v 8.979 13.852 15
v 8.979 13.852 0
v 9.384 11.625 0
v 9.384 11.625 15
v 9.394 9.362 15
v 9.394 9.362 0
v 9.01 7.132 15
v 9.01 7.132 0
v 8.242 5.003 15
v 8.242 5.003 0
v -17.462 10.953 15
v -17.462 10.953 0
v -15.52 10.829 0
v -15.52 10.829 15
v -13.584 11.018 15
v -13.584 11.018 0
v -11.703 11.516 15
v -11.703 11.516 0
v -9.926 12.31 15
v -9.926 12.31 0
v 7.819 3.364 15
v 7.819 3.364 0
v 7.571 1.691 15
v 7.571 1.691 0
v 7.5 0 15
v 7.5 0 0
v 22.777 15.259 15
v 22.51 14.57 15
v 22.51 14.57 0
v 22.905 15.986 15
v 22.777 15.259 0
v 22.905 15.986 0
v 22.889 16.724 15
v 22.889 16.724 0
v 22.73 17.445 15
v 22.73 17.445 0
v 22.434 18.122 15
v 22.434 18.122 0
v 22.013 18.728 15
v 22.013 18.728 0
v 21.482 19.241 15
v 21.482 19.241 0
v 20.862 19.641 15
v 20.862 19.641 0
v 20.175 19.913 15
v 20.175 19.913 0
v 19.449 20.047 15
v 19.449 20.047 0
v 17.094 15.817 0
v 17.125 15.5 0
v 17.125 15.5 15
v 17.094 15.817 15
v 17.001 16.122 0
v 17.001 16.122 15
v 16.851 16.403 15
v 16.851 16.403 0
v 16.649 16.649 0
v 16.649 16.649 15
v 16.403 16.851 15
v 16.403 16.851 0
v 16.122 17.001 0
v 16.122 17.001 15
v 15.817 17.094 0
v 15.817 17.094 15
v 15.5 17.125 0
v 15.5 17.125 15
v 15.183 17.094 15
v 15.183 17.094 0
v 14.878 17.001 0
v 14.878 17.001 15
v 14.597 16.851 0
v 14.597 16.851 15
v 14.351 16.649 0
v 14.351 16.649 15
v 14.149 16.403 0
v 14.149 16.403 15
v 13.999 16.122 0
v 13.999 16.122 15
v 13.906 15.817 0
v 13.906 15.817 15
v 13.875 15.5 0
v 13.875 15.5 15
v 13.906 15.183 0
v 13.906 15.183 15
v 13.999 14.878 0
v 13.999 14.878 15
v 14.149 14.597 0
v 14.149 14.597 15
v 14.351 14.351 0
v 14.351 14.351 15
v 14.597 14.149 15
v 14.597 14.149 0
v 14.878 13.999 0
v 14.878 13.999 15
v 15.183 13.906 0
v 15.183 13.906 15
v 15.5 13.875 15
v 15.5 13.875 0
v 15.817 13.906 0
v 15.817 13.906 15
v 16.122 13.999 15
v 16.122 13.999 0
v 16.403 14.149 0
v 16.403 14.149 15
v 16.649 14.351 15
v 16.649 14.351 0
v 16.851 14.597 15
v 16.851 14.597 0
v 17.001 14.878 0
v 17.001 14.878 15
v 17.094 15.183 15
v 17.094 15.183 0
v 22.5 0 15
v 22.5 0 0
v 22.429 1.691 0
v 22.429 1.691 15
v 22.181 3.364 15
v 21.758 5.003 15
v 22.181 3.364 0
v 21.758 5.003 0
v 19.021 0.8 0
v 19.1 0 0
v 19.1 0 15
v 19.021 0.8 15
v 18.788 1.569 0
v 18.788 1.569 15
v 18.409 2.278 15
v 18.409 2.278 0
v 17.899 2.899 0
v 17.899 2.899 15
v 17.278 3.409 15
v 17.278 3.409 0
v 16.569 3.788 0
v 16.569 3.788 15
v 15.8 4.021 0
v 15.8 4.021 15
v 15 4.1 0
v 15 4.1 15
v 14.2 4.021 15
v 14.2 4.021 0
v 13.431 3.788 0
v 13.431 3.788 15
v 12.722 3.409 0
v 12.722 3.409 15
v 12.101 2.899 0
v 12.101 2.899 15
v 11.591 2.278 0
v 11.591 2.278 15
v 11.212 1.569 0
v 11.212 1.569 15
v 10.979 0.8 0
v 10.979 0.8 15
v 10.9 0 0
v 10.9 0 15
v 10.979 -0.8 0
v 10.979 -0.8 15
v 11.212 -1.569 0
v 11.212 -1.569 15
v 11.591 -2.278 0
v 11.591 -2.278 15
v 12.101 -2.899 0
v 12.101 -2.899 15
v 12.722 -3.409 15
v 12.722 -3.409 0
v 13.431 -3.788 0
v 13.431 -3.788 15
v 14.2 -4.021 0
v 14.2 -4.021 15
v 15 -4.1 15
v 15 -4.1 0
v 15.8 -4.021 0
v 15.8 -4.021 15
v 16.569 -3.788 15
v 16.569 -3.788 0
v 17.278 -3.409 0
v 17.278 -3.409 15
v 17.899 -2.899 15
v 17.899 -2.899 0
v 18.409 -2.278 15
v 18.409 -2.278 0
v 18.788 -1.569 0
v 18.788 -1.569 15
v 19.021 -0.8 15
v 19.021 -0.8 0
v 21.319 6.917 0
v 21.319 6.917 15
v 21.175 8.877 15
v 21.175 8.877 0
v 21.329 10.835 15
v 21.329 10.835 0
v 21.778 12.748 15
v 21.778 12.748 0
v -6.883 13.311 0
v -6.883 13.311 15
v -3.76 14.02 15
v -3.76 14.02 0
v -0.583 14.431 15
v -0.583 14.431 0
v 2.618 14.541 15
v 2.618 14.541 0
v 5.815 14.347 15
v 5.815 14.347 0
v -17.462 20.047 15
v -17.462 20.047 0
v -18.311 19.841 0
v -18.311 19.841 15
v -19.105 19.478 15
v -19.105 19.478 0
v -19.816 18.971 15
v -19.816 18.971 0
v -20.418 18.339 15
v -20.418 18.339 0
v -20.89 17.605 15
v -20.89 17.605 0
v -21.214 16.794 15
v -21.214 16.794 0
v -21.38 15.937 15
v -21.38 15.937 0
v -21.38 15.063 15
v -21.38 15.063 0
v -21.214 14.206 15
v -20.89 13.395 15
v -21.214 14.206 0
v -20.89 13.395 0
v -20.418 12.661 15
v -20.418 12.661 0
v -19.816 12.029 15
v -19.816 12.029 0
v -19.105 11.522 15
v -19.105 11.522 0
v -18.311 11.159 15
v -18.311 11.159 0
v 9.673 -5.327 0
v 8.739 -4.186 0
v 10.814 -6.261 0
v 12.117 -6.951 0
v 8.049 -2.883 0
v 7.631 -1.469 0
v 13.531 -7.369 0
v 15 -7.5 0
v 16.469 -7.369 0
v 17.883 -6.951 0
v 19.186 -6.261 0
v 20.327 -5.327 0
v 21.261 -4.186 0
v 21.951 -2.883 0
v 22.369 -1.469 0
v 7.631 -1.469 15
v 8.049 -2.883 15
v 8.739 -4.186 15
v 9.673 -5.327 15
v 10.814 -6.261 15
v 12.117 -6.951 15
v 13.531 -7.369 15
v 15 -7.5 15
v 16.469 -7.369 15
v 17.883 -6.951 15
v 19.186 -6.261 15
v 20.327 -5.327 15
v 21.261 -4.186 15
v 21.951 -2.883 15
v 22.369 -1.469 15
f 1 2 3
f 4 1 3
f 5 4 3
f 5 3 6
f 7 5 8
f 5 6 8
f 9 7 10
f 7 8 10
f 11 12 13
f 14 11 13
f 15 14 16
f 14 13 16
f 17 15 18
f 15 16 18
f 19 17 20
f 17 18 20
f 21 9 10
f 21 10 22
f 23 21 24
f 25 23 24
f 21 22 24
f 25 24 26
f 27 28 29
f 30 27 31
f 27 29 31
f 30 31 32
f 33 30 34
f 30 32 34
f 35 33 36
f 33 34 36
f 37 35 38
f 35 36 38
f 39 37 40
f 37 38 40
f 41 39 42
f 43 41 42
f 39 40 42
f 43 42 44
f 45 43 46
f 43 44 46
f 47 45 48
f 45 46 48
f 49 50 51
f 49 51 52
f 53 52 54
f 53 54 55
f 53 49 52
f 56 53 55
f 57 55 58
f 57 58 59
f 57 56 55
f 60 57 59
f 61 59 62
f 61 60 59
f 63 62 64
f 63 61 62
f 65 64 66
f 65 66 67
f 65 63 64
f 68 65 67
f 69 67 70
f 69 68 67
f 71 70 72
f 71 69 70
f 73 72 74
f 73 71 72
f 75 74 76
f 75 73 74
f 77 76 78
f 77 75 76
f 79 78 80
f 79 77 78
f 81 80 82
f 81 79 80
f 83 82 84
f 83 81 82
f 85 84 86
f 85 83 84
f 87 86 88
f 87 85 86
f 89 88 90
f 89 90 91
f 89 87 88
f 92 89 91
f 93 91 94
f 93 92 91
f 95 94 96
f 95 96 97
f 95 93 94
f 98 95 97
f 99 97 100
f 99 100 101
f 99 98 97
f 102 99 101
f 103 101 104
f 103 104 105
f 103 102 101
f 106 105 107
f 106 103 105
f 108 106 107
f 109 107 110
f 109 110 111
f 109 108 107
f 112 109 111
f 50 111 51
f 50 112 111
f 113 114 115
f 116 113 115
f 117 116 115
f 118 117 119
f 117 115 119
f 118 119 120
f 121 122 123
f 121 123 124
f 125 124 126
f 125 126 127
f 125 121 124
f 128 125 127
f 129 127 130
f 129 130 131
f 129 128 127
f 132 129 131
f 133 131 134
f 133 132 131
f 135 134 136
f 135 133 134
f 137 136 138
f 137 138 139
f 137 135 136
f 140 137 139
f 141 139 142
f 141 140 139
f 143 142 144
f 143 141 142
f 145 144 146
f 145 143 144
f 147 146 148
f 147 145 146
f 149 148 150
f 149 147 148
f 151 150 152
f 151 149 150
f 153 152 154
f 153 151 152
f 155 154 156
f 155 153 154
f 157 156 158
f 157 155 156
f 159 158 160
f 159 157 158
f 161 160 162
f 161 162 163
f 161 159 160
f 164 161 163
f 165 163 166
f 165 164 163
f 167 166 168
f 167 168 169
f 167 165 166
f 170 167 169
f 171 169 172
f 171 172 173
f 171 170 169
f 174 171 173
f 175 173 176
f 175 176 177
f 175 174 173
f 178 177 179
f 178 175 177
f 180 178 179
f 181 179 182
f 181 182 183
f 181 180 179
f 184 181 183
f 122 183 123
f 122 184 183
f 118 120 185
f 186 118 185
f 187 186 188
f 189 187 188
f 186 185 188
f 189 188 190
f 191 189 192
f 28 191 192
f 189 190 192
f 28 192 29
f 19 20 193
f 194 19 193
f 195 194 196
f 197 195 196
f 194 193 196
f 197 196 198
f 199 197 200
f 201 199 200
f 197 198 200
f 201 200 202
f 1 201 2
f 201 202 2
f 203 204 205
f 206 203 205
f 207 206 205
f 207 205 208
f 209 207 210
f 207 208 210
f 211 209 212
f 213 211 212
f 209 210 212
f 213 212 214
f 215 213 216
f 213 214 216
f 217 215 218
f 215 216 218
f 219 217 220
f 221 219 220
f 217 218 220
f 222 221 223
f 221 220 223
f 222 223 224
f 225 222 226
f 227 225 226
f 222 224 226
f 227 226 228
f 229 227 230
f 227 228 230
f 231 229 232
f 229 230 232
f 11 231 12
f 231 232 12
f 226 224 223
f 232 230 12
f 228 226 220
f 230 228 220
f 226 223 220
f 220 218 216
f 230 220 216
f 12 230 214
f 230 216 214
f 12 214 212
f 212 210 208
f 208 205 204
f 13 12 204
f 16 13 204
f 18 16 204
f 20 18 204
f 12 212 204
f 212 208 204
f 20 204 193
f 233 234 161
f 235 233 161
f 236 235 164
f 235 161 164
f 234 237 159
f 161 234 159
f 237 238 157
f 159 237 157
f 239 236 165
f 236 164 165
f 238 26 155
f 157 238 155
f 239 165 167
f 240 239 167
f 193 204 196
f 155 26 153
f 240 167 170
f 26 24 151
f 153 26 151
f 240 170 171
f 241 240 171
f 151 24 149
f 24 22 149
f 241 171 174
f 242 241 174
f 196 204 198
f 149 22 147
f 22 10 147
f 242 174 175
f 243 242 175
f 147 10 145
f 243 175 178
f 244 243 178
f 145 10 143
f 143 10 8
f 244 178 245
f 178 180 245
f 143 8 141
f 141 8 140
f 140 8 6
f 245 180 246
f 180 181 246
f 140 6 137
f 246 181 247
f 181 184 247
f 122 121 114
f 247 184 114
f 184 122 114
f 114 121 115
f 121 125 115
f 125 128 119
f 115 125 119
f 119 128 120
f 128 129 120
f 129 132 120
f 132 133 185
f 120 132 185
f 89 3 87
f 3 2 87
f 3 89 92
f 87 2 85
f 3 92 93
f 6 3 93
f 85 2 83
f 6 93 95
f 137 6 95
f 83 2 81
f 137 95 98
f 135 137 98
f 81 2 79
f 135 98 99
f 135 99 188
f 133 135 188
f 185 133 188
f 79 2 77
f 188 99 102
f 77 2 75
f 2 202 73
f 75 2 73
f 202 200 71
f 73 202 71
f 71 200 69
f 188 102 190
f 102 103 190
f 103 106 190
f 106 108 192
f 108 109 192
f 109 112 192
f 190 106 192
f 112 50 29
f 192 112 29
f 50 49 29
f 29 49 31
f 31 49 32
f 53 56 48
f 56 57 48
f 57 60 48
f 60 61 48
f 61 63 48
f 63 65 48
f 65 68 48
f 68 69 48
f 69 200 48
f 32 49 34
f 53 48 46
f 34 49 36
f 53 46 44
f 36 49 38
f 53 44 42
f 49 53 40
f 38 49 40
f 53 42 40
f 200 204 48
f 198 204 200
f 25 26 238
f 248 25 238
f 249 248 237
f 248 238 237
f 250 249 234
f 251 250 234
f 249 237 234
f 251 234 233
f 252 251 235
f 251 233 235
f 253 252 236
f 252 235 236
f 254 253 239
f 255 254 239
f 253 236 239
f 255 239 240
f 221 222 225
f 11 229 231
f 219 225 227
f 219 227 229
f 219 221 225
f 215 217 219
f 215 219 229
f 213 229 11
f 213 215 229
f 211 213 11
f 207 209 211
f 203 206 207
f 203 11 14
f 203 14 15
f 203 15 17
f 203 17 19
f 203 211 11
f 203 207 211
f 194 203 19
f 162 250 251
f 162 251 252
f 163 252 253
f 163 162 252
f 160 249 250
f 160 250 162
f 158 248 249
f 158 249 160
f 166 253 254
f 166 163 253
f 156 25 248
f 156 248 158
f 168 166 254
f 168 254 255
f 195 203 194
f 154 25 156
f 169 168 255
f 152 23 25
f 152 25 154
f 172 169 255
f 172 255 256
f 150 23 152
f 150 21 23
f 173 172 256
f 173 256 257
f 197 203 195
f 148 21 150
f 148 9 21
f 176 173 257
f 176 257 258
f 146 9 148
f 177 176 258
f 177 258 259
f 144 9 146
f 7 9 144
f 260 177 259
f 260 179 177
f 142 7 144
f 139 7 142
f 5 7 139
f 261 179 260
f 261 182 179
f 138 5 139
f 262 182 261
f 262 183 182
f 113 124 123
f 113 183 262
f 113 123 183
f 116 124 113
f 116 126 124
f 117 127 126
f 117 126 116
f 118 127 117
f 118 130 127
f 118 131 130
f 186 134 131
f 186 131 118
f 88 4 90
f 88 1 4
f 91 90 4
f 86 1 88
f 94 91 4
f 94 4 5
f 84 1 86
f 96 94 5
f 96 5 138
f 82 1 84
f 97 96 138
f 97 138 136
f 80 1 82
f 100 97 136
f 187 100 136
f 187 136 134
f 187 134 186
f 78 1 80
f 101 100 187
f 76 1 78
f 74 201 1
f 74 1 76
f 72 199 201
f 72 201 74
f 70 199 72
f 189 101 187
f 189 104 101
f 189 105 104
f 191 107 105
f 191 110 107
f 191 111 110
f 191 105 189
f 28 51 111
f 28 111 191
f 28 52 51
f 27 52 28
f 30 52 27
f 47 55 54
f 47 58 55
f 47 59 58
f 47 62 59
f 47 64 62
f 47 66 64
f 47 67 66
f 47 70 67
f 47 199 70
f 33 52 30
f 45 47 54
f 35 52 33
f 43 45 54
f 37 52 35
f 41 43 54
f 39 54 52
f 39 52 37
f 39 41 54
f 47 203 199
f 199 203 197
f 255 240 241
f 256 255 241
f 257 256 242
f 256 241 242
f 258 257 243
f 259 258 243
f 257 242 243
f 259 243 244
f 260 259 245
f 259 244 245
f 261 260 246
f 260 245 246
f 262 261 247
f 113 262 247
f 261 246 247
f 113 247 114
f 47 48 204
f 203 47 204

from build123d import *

# Parameters (mm, degrees)
F0_R     = 4.1
F0_R_2   = 1.625
F1_DEPTH = 15


with BuildPart() as f1:
    # F0 (on Top) → F1 (new body)
    with BuildSketch(Plane.XY):
        with BuildLine():
            Line((19.449329, 20.047105), (-17.462153, 20.047105))
            ThreePointArc((-17.462153, 20.047105), (-21.400342, 15.5), (-17.462153, 10.952895))
            ThreePointArc((-17.462153, 10.952895), (-13.583628, 11.018037), (-9.926019, 12.30997))
            ThreePointArc((-9.926019, 12.30997), (-0.583426, 14.431472), (8.979468, 13.851907))
            ThreePointArc((8.979468, 13.851907), (9.394135, 9.361936), (8.242019, 5.002531))
            ThreePointArc((8.242019, 5.002531), (7.672541, 2.530704), (7.5, 0))
            ThreePointArc((7.5, 0), (9.673183, -5.326817), (15, -7.5))
            ThreePointArc((15, -7.5), (20.326817, -5.326817), (22.5, 0))
            ThreePointArc((22.5, 0), (22.327459, 2.530704), (21.757981, 5.002531))
            ThreePointArc((21.757981, 5.002531), (21.215093, 9.858766), (22.510411, 14.570442))
            ThreePointArc((22.510411, 14.570442), (22.434346, 18.121727), (19.449329, 20.047105))
        make_face()
        with Locations((15, 0)):
            Circle(F0_R, mode=Mode.SUBTRACT)
        with Locations((15.5, 15.5)):
            Circle(F0_R_2, mode=Mode.SUBTRACT)
    extrude(amount=F1_DEPTH)


solid = f1.part
